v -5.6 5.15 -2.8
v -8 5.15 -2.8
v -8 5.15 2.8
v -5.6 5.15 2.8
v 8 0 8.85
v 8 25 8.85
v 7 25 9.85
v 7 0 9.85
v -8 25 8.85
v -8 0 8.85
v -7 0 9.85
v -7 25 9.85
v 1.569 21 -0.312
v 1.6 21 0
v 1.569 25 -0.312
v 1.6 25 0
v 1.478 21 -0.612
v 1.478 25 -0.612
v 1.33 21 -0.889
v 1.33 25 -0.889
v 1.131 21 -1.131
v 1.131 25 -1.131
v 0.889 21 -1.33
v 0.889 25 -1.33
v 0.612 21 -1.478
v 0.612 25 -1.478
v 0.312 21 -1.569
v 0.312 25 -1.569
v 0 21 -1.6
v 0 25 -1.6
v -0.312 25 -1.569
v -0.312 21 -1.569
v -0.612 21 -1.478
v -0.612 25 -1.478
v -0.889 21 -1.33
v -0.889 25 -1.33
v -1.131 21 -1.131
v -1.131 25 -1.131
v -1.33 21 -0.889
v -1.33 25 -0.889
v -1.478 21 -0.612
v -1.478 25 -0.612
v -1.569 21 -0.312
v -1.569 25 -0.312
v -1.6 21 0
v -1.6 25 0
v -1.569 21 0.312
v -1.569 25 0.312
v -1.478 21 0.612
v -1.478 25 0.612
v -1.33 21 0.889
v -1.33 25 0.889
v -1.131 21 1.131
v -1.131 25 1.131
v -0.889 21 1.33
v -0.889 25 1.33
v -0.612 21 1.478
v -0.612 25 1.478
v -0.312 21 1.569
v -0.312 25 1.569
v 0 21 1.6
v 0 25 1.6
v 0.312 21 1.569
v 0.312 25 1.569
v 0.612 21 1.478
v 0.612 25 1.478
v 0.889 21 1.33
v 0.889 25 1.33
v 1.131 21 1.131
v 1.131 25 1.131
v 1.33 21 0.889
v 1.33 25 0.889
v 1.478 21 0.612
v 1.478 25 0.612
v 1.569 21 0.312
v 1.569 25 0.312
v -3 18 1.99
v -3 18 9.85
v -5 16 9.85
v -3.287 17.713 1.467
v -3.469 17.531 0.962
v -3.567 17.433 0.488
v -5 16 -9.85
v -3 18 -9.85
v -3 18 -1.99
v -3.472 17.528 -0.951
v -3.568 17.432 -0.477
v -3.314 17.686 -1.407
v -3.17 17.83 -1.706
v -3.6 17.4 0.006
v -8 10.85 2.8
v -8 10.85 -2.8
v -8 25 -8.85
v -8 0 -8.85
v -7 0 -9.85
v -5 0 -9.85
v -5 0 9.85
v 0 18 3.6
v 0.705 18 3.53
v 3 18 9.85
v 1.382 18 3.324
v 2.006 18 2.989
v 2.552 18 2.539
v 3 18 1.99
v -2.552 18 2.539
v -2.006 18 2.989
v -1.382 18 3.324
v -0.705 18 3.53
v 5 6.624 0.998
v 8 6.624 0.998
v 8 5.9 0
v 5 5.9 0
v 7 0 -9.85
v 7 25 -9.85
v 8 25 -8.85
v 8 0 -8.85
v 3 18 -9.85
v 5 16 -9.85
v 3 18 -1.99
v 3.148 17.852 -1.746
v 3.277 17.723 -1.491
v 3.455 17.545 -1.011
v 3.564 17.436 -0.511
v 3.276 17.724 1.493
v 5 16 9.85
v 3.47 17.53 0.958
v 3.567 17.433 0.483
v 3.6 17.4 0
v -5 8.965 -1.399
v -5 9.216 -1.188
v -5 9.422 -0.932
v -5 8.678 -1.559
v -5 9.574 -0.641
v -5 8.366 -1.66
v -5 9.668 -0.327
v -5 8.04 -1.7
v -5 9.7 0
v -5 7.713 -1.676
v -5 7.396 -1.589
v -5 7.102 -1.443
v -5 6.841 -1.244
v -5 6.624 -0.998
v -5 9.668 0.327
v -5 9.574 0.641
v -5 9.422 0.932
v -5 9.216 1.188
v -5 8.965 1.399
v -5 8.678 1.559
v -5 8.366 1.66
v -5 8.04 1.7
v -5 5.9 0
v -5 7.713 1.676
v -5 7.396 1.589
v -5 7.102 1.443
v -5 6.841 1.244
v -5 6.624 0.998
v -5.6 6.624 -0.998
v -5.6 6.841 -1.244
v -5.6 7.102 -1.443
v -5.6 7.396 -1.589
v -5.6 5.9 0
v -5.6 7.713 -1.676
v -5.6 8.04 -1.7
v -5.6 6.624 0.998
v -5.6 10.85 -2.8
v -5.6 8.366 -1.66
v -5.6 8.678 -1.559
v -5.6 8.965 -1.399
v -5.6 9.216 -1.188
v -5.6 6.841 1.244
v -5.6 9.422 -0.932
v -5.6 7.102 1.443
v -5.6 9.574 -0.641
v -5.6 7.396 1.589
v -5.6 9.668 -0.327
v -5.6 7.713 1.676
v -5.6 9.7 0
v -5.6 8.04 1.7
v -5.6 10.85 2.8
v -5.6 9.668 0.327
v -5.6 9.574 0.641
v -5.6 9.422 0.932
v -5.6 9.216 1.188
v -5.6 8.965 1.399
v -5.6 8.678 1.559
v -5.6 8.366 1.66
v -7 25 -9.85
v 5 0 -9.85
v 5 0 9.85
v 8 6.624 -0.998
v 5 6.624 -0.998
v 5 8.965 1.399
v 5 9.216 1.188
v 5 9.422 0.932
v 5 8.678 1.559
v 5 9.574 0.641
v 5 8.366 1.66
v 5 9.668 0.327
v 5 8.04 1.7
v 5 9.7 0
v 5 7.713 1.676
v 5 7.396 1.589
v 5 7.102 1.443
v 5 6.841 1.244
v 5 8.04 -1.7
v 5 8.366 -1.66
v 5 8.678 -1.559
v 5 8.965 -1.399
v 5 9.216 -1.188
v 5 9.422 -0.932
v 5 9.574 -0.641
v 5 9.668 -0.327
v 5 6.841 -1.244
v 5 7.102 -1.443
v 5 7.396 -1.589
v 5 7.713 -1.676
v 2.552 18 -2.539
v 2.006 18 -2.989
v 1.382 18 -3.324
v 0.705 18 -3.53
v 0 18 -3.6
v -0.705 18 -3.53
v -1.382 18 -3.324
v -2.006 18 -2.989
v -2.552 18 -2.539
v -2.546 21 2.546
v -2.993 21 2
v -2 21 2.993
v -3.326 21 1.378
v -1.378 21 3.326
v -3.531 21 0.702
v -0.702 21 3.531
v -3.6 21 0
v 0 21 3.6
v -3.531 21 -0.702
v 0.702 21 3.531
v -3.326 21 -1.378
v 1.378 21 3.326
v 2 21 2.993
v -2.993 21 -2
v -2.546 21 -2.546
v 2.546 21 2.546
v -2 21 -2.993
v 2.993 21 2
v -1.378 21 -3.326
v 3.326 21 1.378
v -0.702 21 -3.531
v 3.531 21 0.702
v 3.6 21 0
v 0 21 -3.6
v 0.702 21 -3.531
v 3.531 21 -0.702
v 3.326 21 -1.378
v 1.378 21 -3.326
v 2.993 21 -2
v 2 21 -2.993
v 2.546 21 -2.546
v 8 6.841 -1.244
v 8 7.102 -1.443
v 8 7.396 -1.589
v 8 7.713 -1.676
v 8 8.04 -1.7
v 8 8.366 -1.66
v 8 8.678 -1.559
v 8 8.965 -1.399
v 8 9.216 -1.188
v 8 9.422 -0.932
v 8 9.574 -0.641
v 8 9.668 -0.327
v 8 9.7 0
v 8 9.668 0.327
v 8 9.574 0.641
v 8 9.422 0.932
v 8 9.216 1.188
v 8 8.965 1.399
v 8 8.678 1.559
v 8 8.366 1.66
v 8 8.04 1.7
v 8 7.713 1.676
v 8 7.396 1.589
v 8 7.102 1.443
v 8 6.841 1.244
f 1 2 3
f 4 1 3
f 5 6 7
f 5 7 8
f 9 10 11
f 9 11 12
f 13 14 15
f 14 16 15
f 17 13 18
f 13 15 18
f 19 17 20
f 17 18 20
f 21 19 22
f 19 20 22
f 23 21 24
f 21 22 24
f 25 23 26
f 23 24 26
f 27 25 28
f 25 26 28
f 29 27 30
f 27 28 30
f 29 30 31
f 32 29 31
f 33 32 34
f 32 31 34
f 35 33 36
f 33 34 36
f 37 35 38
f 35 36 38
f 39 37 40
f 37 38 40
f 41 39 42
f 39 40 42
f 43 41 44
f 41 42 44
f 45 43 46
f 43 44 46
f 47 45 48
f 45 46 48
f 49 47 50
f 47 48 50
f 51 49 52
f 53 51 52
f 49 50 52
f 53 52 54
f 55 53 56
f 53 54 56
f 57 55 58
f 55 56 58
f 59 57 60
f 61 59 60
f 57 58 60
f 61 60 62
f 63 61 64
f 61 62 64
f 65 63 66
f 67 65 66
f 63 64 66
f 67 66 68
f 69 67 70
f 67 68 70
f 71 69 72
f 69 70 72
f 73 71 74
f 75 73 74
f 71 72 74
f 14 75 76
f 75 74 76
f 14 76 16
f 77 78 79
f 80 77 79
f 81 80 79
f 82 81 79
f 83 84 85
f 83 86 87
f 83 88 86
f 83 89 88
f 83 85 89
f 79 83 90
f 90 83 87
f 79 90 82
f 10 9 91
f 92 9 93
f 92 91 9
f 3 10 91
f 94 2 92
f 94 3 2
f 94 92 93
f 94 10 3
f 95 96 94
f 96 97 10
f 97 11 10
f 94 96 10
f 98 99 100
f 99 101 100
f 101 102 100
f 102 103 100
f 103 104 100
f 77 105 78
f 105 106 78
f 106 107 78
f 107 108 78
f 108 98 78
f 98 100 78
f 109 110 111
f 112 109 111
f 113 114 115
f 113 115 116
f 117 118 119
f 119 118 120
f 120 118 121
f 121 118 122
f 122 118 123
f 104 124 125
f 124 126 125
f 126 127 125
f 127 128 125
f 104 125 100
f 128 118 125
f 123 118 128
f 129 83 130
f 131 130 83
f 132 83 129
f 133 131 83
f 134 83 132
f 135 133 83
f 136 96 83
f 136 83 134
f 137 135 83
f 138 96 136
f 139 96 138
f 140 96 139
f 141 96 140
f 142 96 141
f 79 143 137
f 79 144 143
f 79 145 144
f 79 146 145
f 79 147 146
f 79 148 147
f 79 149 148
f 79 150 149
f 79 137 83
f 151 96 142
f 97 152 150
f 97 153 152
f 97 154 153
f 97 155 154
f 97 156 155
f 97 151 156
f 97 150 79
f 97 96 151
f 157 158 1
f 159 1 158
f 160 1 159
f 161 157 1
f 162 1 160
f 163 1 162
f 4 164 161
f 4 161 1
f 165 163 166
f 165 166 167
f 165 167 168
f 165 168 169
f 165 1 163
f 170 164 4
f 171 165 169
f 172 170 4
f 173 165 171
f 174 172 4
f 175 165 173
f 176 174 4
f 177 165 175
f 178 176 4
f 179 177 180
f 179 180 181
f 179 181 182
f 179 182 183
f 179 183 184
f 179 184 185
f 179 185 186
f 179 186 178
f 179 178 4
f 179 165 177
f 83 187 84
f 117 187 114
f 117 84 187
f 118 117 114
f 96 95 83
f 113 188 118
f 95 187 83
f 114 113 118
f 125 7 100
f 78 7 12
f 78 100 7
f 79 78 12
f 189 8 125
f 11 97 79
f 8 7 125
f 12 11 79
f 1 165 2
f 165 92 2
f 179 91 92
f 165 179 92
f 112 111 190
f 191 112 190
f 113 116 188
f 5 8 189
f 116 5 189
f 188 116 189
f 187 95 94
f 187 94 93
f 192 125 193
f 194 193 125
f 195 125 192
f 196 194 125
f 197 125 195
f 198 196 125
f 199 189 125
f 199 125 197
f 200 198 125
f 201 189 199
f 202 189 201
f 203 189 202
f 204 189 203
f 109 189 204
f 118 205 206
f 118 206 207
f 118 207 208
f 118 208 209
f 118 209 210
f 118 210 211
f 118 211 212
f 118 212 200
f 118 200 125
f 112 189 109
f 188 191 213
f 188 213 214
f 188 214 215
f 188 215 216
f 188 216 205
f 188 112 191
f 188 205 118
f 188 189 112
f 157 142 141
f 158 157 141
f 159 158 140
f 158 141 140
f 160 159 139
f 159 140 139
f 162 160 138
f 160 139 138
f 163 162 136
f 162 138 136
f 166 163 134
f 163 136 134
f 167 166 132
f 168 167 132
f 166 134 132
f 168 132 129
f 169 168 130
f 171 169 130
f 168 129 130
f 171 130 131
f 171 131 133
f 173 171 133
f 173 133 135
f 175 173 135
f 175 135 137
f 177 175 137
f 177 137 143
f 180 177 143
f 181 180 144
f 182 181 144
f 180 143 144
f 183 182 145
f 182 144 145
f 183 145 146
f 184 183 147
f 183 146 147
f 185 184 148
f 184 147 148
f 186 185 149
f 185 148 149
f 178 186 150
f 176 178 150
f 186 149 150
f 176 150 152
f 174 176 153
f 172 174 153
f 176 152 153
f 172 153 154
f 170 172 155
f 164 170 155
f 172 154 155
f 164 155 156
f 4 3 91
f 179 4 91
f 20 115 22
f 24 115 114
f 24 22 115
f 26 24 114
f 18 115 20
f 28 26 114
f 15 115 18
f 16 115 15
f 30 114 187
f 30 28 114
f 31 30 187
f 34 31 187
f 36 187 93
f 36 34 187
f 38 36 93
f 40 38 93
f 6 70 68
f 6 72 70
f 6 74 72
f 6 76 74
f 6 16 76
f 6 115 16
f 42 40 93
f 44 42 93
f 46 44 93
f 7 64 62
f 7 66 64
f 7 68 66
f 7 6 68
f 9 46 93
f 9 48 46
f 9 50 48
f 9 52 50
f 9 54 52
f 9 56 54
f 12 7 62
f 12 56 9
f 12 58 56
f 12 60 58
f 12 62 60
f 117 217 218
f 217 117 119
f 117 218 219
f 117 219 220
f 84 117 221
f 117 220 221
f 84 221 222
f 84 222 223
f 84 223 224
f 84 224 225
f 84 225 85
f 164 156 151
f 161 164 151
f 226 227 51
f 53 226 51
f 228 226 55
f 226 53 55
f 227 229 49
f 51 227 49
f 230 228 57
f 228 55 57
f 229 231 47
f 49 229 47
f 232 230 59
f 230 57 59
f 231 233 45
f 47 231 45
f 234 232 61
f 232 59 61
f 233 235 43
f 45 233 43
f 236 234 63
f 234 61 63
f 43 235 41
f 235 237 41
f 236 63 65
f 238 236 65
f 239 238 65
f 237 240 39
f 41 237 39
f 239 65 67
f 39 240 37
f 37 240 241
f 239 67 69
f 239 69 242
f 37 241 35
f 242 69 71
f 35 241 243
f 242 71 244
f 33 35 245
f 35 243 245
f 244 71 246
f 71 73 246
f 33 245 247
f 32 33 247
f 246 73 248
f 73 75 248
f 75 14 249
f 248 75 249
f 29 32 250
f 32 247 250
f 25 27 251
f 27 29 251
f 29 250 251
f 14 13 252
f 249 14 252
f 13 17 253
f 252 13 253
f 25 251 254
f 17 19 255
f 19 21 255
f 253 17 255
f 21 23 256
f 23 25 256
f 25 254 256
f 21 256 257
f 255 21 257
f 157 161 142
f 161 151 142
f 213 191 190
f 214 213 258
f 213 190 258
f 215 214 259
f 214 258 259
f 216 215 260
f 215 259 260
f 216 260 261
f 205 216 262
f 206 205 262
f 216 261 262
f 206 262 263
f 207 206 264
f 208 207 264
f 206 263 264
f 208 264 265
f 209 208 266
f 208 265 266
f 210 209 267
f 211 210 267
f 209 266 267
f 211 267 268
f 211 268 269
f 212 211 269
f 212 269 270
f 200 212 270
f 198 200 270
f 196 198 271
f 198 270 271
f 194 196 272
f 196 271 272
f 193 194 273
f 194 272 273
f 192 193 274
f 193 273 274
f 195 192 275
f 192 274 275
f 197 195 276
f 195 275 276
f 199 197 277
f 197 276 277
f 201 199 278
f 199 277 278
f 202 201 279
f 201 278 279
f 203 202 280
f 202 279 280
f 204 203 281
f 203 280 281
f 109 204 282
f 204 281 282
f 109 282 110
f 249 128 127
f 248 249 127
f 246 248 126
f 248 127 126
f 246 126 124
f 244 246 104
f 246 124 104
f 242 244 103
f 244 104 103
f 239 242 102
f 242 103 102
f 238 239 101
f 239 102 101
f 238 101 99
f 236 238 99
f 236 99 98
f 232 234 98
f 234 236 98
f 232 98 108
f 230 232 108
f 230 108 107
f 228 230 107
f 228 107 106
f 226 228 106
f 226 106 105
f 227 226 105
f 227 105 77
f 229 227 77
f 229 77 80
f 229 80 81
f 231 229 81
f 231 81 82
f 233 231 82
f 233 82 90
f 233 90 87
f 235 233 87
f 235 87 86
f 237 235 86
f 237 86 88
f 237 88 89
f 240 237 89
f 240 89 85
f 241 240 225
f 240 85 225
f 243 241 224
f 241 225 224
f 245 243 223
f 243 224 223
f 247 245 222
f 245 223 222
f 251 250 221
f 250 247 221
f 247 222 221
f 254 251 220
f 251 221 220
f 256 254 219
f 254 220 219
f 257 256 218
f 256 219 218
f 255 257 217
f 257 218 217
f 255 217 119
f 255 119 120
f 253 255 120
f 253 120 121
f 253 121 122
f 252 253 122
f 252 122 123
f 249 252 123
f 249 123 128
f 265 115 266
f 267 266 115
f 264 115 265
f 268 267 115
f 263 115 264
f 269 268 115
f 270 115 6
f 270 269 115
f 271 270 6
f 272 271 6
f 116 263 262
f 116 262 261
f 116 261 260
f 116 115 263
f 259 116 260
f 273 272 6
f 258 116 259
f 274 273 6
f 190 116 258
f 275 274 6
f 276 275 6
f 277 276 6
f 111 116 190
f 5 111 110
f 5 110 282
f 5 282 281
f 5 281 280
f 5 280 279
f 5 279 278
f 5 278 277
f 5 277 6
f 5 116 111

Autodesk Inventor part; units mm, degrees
ref_plane "YZ Plane" through (0, 0, 0) normal (1, 0, 0) x (0, 1, 0)
ref_plane "XZ Plane" through (0, 0, 0) normal (0, 1, 0) x (-1, 0, 0)
ref_plane "XY Plane" through (0, 0, 0) normal (0, 0, 1) x (1, 0, 0)
sketch "Sketch3" plane through (0, 0, 0) normal (0, 1, 0) x (-1, 0, 0)
  line L0 (-8, 9.85) -> (8, 9.85)
  line L1 (8, 9.85) -> (8, -9.85)
  line L2 (8, -9.85) -> (-8, -9.85)
  line L3 (-8, -9.85) -> (-8, 9.85)
  line L4 (-8, 9.85) -> (8, -9.85) construction
  line L5 (8, 9.85) -> (-8, -9.85) construction
  line L6 (5, -9.85) -> (5, 9.85)
  line L7 (-5, 9.85) -> (-5, -9.85)
  line L8 (-5, -6.1562) -> (5, -6.1562) construction
  point P0 (0, 0)
  dimension "d12" = 19.7
  dimension "d36" = 10
  dimension "d52" = 16
extrude "Extrusion3" add sketch "Sketch3" along normal blind 25
sketch "Sketch4" plane through (8, 0, 9.85) normal (1, 0, 0) x (0, 0, -1)
  line L0 (9.85, 0) -> (9.85, 8) construction
  circle A0 centre (9.85, 8) radius 1.7
  line L1 (0, 0) -> (19.7, 0) projected
  line L2 (9.85, 5.9) -> (10.848, 6.6238)
  line L3 (8.852, 6.6238) -> (9.85, 5.9)
  dimension "d15" = 3.4
  dimension "d16" = 8
  dimension "d53" = 2.1
extrude "Extrusion4" cut sketch "Sketch3" along normal blind 18 contours L0 L6 L2 L7
extrude "Extrusion5" cut sketch "Sketch4" against normal through all
sketch "Sketch7" plane through (0, 25, 0) normal (0, 1, 0) x (1, 0, 0)
  circle A0 centre (0, 0) radius 1.6
  circle A1 centre (0, 0) radius 3.6
  line L0 (-5, 10) -> (5, -10) construction
  line L1 (8, 9.85) -> (-8, 9.85) projected
  line L2 (-8, 9.85) -> (-8, -9.85) projected
  line L3 (-8, -9.85) -> (8, -9.85) projected
  line L4 (8, -9.85) -> (8, 9.85) projected
  line L5 (-8, 9.85) -> (8, -9.85) construction
  line L6 (8, 9.85) -> (-8, -9.85) construction
  dimension "d30" = 3.2
  dimension "d47" = 7.2
extrude "Extrusion8" cut sketch "Sketch7" along normal through all both and the other way through all contours A0
extrude "Extrusion9" cut sketch "Sketch7" along normal blind 3 from surface at -7 contours A1
chamfer "Chamfer2" distance 2 angle 45 2 edges at (5, 18, 0) (-5, 18, 0)
chamfer "Chamfer3" distance 1 angle 45 4 edges at (-8, 12.5, 9.85) (-8, 12.5, -9.85) (8, 12.5, -9.85) (8, 12.5, 9.85)
sketch "Sketch9" plane through (-8, 0, -8.85) normal (-1, 0, 0) x (0, 0, 1)
  arc A0 (9.848, 6.6238) -> (7.852, 6.6238) centre (8.85, 8) ccw projected
  line L0 (6.05, 5.15) -> (11.65, 5.15)
  line L1 (11.65, 5.15) -> (11.65, 10.85)
  line L2 (11.65, 10.85) -> (6.05, 10.85)
  line L3 (6.05, 10.85) -> (6.05, 5.15)
  line L4 (6.05, 5.15) -> (11.65, 10.85) construction
  line L5 (11.65, 5.15) -> (6.05, 10.85) construction
  point P0 (8.85, 0)
  dimension "d57" = 5.6
  dimension "d58" = 5.7
extrude "Extrusion10" cut sketch "Sketch9" against normal blind 2.4
properties part number "Idlert Tensioner_3DPrint"
